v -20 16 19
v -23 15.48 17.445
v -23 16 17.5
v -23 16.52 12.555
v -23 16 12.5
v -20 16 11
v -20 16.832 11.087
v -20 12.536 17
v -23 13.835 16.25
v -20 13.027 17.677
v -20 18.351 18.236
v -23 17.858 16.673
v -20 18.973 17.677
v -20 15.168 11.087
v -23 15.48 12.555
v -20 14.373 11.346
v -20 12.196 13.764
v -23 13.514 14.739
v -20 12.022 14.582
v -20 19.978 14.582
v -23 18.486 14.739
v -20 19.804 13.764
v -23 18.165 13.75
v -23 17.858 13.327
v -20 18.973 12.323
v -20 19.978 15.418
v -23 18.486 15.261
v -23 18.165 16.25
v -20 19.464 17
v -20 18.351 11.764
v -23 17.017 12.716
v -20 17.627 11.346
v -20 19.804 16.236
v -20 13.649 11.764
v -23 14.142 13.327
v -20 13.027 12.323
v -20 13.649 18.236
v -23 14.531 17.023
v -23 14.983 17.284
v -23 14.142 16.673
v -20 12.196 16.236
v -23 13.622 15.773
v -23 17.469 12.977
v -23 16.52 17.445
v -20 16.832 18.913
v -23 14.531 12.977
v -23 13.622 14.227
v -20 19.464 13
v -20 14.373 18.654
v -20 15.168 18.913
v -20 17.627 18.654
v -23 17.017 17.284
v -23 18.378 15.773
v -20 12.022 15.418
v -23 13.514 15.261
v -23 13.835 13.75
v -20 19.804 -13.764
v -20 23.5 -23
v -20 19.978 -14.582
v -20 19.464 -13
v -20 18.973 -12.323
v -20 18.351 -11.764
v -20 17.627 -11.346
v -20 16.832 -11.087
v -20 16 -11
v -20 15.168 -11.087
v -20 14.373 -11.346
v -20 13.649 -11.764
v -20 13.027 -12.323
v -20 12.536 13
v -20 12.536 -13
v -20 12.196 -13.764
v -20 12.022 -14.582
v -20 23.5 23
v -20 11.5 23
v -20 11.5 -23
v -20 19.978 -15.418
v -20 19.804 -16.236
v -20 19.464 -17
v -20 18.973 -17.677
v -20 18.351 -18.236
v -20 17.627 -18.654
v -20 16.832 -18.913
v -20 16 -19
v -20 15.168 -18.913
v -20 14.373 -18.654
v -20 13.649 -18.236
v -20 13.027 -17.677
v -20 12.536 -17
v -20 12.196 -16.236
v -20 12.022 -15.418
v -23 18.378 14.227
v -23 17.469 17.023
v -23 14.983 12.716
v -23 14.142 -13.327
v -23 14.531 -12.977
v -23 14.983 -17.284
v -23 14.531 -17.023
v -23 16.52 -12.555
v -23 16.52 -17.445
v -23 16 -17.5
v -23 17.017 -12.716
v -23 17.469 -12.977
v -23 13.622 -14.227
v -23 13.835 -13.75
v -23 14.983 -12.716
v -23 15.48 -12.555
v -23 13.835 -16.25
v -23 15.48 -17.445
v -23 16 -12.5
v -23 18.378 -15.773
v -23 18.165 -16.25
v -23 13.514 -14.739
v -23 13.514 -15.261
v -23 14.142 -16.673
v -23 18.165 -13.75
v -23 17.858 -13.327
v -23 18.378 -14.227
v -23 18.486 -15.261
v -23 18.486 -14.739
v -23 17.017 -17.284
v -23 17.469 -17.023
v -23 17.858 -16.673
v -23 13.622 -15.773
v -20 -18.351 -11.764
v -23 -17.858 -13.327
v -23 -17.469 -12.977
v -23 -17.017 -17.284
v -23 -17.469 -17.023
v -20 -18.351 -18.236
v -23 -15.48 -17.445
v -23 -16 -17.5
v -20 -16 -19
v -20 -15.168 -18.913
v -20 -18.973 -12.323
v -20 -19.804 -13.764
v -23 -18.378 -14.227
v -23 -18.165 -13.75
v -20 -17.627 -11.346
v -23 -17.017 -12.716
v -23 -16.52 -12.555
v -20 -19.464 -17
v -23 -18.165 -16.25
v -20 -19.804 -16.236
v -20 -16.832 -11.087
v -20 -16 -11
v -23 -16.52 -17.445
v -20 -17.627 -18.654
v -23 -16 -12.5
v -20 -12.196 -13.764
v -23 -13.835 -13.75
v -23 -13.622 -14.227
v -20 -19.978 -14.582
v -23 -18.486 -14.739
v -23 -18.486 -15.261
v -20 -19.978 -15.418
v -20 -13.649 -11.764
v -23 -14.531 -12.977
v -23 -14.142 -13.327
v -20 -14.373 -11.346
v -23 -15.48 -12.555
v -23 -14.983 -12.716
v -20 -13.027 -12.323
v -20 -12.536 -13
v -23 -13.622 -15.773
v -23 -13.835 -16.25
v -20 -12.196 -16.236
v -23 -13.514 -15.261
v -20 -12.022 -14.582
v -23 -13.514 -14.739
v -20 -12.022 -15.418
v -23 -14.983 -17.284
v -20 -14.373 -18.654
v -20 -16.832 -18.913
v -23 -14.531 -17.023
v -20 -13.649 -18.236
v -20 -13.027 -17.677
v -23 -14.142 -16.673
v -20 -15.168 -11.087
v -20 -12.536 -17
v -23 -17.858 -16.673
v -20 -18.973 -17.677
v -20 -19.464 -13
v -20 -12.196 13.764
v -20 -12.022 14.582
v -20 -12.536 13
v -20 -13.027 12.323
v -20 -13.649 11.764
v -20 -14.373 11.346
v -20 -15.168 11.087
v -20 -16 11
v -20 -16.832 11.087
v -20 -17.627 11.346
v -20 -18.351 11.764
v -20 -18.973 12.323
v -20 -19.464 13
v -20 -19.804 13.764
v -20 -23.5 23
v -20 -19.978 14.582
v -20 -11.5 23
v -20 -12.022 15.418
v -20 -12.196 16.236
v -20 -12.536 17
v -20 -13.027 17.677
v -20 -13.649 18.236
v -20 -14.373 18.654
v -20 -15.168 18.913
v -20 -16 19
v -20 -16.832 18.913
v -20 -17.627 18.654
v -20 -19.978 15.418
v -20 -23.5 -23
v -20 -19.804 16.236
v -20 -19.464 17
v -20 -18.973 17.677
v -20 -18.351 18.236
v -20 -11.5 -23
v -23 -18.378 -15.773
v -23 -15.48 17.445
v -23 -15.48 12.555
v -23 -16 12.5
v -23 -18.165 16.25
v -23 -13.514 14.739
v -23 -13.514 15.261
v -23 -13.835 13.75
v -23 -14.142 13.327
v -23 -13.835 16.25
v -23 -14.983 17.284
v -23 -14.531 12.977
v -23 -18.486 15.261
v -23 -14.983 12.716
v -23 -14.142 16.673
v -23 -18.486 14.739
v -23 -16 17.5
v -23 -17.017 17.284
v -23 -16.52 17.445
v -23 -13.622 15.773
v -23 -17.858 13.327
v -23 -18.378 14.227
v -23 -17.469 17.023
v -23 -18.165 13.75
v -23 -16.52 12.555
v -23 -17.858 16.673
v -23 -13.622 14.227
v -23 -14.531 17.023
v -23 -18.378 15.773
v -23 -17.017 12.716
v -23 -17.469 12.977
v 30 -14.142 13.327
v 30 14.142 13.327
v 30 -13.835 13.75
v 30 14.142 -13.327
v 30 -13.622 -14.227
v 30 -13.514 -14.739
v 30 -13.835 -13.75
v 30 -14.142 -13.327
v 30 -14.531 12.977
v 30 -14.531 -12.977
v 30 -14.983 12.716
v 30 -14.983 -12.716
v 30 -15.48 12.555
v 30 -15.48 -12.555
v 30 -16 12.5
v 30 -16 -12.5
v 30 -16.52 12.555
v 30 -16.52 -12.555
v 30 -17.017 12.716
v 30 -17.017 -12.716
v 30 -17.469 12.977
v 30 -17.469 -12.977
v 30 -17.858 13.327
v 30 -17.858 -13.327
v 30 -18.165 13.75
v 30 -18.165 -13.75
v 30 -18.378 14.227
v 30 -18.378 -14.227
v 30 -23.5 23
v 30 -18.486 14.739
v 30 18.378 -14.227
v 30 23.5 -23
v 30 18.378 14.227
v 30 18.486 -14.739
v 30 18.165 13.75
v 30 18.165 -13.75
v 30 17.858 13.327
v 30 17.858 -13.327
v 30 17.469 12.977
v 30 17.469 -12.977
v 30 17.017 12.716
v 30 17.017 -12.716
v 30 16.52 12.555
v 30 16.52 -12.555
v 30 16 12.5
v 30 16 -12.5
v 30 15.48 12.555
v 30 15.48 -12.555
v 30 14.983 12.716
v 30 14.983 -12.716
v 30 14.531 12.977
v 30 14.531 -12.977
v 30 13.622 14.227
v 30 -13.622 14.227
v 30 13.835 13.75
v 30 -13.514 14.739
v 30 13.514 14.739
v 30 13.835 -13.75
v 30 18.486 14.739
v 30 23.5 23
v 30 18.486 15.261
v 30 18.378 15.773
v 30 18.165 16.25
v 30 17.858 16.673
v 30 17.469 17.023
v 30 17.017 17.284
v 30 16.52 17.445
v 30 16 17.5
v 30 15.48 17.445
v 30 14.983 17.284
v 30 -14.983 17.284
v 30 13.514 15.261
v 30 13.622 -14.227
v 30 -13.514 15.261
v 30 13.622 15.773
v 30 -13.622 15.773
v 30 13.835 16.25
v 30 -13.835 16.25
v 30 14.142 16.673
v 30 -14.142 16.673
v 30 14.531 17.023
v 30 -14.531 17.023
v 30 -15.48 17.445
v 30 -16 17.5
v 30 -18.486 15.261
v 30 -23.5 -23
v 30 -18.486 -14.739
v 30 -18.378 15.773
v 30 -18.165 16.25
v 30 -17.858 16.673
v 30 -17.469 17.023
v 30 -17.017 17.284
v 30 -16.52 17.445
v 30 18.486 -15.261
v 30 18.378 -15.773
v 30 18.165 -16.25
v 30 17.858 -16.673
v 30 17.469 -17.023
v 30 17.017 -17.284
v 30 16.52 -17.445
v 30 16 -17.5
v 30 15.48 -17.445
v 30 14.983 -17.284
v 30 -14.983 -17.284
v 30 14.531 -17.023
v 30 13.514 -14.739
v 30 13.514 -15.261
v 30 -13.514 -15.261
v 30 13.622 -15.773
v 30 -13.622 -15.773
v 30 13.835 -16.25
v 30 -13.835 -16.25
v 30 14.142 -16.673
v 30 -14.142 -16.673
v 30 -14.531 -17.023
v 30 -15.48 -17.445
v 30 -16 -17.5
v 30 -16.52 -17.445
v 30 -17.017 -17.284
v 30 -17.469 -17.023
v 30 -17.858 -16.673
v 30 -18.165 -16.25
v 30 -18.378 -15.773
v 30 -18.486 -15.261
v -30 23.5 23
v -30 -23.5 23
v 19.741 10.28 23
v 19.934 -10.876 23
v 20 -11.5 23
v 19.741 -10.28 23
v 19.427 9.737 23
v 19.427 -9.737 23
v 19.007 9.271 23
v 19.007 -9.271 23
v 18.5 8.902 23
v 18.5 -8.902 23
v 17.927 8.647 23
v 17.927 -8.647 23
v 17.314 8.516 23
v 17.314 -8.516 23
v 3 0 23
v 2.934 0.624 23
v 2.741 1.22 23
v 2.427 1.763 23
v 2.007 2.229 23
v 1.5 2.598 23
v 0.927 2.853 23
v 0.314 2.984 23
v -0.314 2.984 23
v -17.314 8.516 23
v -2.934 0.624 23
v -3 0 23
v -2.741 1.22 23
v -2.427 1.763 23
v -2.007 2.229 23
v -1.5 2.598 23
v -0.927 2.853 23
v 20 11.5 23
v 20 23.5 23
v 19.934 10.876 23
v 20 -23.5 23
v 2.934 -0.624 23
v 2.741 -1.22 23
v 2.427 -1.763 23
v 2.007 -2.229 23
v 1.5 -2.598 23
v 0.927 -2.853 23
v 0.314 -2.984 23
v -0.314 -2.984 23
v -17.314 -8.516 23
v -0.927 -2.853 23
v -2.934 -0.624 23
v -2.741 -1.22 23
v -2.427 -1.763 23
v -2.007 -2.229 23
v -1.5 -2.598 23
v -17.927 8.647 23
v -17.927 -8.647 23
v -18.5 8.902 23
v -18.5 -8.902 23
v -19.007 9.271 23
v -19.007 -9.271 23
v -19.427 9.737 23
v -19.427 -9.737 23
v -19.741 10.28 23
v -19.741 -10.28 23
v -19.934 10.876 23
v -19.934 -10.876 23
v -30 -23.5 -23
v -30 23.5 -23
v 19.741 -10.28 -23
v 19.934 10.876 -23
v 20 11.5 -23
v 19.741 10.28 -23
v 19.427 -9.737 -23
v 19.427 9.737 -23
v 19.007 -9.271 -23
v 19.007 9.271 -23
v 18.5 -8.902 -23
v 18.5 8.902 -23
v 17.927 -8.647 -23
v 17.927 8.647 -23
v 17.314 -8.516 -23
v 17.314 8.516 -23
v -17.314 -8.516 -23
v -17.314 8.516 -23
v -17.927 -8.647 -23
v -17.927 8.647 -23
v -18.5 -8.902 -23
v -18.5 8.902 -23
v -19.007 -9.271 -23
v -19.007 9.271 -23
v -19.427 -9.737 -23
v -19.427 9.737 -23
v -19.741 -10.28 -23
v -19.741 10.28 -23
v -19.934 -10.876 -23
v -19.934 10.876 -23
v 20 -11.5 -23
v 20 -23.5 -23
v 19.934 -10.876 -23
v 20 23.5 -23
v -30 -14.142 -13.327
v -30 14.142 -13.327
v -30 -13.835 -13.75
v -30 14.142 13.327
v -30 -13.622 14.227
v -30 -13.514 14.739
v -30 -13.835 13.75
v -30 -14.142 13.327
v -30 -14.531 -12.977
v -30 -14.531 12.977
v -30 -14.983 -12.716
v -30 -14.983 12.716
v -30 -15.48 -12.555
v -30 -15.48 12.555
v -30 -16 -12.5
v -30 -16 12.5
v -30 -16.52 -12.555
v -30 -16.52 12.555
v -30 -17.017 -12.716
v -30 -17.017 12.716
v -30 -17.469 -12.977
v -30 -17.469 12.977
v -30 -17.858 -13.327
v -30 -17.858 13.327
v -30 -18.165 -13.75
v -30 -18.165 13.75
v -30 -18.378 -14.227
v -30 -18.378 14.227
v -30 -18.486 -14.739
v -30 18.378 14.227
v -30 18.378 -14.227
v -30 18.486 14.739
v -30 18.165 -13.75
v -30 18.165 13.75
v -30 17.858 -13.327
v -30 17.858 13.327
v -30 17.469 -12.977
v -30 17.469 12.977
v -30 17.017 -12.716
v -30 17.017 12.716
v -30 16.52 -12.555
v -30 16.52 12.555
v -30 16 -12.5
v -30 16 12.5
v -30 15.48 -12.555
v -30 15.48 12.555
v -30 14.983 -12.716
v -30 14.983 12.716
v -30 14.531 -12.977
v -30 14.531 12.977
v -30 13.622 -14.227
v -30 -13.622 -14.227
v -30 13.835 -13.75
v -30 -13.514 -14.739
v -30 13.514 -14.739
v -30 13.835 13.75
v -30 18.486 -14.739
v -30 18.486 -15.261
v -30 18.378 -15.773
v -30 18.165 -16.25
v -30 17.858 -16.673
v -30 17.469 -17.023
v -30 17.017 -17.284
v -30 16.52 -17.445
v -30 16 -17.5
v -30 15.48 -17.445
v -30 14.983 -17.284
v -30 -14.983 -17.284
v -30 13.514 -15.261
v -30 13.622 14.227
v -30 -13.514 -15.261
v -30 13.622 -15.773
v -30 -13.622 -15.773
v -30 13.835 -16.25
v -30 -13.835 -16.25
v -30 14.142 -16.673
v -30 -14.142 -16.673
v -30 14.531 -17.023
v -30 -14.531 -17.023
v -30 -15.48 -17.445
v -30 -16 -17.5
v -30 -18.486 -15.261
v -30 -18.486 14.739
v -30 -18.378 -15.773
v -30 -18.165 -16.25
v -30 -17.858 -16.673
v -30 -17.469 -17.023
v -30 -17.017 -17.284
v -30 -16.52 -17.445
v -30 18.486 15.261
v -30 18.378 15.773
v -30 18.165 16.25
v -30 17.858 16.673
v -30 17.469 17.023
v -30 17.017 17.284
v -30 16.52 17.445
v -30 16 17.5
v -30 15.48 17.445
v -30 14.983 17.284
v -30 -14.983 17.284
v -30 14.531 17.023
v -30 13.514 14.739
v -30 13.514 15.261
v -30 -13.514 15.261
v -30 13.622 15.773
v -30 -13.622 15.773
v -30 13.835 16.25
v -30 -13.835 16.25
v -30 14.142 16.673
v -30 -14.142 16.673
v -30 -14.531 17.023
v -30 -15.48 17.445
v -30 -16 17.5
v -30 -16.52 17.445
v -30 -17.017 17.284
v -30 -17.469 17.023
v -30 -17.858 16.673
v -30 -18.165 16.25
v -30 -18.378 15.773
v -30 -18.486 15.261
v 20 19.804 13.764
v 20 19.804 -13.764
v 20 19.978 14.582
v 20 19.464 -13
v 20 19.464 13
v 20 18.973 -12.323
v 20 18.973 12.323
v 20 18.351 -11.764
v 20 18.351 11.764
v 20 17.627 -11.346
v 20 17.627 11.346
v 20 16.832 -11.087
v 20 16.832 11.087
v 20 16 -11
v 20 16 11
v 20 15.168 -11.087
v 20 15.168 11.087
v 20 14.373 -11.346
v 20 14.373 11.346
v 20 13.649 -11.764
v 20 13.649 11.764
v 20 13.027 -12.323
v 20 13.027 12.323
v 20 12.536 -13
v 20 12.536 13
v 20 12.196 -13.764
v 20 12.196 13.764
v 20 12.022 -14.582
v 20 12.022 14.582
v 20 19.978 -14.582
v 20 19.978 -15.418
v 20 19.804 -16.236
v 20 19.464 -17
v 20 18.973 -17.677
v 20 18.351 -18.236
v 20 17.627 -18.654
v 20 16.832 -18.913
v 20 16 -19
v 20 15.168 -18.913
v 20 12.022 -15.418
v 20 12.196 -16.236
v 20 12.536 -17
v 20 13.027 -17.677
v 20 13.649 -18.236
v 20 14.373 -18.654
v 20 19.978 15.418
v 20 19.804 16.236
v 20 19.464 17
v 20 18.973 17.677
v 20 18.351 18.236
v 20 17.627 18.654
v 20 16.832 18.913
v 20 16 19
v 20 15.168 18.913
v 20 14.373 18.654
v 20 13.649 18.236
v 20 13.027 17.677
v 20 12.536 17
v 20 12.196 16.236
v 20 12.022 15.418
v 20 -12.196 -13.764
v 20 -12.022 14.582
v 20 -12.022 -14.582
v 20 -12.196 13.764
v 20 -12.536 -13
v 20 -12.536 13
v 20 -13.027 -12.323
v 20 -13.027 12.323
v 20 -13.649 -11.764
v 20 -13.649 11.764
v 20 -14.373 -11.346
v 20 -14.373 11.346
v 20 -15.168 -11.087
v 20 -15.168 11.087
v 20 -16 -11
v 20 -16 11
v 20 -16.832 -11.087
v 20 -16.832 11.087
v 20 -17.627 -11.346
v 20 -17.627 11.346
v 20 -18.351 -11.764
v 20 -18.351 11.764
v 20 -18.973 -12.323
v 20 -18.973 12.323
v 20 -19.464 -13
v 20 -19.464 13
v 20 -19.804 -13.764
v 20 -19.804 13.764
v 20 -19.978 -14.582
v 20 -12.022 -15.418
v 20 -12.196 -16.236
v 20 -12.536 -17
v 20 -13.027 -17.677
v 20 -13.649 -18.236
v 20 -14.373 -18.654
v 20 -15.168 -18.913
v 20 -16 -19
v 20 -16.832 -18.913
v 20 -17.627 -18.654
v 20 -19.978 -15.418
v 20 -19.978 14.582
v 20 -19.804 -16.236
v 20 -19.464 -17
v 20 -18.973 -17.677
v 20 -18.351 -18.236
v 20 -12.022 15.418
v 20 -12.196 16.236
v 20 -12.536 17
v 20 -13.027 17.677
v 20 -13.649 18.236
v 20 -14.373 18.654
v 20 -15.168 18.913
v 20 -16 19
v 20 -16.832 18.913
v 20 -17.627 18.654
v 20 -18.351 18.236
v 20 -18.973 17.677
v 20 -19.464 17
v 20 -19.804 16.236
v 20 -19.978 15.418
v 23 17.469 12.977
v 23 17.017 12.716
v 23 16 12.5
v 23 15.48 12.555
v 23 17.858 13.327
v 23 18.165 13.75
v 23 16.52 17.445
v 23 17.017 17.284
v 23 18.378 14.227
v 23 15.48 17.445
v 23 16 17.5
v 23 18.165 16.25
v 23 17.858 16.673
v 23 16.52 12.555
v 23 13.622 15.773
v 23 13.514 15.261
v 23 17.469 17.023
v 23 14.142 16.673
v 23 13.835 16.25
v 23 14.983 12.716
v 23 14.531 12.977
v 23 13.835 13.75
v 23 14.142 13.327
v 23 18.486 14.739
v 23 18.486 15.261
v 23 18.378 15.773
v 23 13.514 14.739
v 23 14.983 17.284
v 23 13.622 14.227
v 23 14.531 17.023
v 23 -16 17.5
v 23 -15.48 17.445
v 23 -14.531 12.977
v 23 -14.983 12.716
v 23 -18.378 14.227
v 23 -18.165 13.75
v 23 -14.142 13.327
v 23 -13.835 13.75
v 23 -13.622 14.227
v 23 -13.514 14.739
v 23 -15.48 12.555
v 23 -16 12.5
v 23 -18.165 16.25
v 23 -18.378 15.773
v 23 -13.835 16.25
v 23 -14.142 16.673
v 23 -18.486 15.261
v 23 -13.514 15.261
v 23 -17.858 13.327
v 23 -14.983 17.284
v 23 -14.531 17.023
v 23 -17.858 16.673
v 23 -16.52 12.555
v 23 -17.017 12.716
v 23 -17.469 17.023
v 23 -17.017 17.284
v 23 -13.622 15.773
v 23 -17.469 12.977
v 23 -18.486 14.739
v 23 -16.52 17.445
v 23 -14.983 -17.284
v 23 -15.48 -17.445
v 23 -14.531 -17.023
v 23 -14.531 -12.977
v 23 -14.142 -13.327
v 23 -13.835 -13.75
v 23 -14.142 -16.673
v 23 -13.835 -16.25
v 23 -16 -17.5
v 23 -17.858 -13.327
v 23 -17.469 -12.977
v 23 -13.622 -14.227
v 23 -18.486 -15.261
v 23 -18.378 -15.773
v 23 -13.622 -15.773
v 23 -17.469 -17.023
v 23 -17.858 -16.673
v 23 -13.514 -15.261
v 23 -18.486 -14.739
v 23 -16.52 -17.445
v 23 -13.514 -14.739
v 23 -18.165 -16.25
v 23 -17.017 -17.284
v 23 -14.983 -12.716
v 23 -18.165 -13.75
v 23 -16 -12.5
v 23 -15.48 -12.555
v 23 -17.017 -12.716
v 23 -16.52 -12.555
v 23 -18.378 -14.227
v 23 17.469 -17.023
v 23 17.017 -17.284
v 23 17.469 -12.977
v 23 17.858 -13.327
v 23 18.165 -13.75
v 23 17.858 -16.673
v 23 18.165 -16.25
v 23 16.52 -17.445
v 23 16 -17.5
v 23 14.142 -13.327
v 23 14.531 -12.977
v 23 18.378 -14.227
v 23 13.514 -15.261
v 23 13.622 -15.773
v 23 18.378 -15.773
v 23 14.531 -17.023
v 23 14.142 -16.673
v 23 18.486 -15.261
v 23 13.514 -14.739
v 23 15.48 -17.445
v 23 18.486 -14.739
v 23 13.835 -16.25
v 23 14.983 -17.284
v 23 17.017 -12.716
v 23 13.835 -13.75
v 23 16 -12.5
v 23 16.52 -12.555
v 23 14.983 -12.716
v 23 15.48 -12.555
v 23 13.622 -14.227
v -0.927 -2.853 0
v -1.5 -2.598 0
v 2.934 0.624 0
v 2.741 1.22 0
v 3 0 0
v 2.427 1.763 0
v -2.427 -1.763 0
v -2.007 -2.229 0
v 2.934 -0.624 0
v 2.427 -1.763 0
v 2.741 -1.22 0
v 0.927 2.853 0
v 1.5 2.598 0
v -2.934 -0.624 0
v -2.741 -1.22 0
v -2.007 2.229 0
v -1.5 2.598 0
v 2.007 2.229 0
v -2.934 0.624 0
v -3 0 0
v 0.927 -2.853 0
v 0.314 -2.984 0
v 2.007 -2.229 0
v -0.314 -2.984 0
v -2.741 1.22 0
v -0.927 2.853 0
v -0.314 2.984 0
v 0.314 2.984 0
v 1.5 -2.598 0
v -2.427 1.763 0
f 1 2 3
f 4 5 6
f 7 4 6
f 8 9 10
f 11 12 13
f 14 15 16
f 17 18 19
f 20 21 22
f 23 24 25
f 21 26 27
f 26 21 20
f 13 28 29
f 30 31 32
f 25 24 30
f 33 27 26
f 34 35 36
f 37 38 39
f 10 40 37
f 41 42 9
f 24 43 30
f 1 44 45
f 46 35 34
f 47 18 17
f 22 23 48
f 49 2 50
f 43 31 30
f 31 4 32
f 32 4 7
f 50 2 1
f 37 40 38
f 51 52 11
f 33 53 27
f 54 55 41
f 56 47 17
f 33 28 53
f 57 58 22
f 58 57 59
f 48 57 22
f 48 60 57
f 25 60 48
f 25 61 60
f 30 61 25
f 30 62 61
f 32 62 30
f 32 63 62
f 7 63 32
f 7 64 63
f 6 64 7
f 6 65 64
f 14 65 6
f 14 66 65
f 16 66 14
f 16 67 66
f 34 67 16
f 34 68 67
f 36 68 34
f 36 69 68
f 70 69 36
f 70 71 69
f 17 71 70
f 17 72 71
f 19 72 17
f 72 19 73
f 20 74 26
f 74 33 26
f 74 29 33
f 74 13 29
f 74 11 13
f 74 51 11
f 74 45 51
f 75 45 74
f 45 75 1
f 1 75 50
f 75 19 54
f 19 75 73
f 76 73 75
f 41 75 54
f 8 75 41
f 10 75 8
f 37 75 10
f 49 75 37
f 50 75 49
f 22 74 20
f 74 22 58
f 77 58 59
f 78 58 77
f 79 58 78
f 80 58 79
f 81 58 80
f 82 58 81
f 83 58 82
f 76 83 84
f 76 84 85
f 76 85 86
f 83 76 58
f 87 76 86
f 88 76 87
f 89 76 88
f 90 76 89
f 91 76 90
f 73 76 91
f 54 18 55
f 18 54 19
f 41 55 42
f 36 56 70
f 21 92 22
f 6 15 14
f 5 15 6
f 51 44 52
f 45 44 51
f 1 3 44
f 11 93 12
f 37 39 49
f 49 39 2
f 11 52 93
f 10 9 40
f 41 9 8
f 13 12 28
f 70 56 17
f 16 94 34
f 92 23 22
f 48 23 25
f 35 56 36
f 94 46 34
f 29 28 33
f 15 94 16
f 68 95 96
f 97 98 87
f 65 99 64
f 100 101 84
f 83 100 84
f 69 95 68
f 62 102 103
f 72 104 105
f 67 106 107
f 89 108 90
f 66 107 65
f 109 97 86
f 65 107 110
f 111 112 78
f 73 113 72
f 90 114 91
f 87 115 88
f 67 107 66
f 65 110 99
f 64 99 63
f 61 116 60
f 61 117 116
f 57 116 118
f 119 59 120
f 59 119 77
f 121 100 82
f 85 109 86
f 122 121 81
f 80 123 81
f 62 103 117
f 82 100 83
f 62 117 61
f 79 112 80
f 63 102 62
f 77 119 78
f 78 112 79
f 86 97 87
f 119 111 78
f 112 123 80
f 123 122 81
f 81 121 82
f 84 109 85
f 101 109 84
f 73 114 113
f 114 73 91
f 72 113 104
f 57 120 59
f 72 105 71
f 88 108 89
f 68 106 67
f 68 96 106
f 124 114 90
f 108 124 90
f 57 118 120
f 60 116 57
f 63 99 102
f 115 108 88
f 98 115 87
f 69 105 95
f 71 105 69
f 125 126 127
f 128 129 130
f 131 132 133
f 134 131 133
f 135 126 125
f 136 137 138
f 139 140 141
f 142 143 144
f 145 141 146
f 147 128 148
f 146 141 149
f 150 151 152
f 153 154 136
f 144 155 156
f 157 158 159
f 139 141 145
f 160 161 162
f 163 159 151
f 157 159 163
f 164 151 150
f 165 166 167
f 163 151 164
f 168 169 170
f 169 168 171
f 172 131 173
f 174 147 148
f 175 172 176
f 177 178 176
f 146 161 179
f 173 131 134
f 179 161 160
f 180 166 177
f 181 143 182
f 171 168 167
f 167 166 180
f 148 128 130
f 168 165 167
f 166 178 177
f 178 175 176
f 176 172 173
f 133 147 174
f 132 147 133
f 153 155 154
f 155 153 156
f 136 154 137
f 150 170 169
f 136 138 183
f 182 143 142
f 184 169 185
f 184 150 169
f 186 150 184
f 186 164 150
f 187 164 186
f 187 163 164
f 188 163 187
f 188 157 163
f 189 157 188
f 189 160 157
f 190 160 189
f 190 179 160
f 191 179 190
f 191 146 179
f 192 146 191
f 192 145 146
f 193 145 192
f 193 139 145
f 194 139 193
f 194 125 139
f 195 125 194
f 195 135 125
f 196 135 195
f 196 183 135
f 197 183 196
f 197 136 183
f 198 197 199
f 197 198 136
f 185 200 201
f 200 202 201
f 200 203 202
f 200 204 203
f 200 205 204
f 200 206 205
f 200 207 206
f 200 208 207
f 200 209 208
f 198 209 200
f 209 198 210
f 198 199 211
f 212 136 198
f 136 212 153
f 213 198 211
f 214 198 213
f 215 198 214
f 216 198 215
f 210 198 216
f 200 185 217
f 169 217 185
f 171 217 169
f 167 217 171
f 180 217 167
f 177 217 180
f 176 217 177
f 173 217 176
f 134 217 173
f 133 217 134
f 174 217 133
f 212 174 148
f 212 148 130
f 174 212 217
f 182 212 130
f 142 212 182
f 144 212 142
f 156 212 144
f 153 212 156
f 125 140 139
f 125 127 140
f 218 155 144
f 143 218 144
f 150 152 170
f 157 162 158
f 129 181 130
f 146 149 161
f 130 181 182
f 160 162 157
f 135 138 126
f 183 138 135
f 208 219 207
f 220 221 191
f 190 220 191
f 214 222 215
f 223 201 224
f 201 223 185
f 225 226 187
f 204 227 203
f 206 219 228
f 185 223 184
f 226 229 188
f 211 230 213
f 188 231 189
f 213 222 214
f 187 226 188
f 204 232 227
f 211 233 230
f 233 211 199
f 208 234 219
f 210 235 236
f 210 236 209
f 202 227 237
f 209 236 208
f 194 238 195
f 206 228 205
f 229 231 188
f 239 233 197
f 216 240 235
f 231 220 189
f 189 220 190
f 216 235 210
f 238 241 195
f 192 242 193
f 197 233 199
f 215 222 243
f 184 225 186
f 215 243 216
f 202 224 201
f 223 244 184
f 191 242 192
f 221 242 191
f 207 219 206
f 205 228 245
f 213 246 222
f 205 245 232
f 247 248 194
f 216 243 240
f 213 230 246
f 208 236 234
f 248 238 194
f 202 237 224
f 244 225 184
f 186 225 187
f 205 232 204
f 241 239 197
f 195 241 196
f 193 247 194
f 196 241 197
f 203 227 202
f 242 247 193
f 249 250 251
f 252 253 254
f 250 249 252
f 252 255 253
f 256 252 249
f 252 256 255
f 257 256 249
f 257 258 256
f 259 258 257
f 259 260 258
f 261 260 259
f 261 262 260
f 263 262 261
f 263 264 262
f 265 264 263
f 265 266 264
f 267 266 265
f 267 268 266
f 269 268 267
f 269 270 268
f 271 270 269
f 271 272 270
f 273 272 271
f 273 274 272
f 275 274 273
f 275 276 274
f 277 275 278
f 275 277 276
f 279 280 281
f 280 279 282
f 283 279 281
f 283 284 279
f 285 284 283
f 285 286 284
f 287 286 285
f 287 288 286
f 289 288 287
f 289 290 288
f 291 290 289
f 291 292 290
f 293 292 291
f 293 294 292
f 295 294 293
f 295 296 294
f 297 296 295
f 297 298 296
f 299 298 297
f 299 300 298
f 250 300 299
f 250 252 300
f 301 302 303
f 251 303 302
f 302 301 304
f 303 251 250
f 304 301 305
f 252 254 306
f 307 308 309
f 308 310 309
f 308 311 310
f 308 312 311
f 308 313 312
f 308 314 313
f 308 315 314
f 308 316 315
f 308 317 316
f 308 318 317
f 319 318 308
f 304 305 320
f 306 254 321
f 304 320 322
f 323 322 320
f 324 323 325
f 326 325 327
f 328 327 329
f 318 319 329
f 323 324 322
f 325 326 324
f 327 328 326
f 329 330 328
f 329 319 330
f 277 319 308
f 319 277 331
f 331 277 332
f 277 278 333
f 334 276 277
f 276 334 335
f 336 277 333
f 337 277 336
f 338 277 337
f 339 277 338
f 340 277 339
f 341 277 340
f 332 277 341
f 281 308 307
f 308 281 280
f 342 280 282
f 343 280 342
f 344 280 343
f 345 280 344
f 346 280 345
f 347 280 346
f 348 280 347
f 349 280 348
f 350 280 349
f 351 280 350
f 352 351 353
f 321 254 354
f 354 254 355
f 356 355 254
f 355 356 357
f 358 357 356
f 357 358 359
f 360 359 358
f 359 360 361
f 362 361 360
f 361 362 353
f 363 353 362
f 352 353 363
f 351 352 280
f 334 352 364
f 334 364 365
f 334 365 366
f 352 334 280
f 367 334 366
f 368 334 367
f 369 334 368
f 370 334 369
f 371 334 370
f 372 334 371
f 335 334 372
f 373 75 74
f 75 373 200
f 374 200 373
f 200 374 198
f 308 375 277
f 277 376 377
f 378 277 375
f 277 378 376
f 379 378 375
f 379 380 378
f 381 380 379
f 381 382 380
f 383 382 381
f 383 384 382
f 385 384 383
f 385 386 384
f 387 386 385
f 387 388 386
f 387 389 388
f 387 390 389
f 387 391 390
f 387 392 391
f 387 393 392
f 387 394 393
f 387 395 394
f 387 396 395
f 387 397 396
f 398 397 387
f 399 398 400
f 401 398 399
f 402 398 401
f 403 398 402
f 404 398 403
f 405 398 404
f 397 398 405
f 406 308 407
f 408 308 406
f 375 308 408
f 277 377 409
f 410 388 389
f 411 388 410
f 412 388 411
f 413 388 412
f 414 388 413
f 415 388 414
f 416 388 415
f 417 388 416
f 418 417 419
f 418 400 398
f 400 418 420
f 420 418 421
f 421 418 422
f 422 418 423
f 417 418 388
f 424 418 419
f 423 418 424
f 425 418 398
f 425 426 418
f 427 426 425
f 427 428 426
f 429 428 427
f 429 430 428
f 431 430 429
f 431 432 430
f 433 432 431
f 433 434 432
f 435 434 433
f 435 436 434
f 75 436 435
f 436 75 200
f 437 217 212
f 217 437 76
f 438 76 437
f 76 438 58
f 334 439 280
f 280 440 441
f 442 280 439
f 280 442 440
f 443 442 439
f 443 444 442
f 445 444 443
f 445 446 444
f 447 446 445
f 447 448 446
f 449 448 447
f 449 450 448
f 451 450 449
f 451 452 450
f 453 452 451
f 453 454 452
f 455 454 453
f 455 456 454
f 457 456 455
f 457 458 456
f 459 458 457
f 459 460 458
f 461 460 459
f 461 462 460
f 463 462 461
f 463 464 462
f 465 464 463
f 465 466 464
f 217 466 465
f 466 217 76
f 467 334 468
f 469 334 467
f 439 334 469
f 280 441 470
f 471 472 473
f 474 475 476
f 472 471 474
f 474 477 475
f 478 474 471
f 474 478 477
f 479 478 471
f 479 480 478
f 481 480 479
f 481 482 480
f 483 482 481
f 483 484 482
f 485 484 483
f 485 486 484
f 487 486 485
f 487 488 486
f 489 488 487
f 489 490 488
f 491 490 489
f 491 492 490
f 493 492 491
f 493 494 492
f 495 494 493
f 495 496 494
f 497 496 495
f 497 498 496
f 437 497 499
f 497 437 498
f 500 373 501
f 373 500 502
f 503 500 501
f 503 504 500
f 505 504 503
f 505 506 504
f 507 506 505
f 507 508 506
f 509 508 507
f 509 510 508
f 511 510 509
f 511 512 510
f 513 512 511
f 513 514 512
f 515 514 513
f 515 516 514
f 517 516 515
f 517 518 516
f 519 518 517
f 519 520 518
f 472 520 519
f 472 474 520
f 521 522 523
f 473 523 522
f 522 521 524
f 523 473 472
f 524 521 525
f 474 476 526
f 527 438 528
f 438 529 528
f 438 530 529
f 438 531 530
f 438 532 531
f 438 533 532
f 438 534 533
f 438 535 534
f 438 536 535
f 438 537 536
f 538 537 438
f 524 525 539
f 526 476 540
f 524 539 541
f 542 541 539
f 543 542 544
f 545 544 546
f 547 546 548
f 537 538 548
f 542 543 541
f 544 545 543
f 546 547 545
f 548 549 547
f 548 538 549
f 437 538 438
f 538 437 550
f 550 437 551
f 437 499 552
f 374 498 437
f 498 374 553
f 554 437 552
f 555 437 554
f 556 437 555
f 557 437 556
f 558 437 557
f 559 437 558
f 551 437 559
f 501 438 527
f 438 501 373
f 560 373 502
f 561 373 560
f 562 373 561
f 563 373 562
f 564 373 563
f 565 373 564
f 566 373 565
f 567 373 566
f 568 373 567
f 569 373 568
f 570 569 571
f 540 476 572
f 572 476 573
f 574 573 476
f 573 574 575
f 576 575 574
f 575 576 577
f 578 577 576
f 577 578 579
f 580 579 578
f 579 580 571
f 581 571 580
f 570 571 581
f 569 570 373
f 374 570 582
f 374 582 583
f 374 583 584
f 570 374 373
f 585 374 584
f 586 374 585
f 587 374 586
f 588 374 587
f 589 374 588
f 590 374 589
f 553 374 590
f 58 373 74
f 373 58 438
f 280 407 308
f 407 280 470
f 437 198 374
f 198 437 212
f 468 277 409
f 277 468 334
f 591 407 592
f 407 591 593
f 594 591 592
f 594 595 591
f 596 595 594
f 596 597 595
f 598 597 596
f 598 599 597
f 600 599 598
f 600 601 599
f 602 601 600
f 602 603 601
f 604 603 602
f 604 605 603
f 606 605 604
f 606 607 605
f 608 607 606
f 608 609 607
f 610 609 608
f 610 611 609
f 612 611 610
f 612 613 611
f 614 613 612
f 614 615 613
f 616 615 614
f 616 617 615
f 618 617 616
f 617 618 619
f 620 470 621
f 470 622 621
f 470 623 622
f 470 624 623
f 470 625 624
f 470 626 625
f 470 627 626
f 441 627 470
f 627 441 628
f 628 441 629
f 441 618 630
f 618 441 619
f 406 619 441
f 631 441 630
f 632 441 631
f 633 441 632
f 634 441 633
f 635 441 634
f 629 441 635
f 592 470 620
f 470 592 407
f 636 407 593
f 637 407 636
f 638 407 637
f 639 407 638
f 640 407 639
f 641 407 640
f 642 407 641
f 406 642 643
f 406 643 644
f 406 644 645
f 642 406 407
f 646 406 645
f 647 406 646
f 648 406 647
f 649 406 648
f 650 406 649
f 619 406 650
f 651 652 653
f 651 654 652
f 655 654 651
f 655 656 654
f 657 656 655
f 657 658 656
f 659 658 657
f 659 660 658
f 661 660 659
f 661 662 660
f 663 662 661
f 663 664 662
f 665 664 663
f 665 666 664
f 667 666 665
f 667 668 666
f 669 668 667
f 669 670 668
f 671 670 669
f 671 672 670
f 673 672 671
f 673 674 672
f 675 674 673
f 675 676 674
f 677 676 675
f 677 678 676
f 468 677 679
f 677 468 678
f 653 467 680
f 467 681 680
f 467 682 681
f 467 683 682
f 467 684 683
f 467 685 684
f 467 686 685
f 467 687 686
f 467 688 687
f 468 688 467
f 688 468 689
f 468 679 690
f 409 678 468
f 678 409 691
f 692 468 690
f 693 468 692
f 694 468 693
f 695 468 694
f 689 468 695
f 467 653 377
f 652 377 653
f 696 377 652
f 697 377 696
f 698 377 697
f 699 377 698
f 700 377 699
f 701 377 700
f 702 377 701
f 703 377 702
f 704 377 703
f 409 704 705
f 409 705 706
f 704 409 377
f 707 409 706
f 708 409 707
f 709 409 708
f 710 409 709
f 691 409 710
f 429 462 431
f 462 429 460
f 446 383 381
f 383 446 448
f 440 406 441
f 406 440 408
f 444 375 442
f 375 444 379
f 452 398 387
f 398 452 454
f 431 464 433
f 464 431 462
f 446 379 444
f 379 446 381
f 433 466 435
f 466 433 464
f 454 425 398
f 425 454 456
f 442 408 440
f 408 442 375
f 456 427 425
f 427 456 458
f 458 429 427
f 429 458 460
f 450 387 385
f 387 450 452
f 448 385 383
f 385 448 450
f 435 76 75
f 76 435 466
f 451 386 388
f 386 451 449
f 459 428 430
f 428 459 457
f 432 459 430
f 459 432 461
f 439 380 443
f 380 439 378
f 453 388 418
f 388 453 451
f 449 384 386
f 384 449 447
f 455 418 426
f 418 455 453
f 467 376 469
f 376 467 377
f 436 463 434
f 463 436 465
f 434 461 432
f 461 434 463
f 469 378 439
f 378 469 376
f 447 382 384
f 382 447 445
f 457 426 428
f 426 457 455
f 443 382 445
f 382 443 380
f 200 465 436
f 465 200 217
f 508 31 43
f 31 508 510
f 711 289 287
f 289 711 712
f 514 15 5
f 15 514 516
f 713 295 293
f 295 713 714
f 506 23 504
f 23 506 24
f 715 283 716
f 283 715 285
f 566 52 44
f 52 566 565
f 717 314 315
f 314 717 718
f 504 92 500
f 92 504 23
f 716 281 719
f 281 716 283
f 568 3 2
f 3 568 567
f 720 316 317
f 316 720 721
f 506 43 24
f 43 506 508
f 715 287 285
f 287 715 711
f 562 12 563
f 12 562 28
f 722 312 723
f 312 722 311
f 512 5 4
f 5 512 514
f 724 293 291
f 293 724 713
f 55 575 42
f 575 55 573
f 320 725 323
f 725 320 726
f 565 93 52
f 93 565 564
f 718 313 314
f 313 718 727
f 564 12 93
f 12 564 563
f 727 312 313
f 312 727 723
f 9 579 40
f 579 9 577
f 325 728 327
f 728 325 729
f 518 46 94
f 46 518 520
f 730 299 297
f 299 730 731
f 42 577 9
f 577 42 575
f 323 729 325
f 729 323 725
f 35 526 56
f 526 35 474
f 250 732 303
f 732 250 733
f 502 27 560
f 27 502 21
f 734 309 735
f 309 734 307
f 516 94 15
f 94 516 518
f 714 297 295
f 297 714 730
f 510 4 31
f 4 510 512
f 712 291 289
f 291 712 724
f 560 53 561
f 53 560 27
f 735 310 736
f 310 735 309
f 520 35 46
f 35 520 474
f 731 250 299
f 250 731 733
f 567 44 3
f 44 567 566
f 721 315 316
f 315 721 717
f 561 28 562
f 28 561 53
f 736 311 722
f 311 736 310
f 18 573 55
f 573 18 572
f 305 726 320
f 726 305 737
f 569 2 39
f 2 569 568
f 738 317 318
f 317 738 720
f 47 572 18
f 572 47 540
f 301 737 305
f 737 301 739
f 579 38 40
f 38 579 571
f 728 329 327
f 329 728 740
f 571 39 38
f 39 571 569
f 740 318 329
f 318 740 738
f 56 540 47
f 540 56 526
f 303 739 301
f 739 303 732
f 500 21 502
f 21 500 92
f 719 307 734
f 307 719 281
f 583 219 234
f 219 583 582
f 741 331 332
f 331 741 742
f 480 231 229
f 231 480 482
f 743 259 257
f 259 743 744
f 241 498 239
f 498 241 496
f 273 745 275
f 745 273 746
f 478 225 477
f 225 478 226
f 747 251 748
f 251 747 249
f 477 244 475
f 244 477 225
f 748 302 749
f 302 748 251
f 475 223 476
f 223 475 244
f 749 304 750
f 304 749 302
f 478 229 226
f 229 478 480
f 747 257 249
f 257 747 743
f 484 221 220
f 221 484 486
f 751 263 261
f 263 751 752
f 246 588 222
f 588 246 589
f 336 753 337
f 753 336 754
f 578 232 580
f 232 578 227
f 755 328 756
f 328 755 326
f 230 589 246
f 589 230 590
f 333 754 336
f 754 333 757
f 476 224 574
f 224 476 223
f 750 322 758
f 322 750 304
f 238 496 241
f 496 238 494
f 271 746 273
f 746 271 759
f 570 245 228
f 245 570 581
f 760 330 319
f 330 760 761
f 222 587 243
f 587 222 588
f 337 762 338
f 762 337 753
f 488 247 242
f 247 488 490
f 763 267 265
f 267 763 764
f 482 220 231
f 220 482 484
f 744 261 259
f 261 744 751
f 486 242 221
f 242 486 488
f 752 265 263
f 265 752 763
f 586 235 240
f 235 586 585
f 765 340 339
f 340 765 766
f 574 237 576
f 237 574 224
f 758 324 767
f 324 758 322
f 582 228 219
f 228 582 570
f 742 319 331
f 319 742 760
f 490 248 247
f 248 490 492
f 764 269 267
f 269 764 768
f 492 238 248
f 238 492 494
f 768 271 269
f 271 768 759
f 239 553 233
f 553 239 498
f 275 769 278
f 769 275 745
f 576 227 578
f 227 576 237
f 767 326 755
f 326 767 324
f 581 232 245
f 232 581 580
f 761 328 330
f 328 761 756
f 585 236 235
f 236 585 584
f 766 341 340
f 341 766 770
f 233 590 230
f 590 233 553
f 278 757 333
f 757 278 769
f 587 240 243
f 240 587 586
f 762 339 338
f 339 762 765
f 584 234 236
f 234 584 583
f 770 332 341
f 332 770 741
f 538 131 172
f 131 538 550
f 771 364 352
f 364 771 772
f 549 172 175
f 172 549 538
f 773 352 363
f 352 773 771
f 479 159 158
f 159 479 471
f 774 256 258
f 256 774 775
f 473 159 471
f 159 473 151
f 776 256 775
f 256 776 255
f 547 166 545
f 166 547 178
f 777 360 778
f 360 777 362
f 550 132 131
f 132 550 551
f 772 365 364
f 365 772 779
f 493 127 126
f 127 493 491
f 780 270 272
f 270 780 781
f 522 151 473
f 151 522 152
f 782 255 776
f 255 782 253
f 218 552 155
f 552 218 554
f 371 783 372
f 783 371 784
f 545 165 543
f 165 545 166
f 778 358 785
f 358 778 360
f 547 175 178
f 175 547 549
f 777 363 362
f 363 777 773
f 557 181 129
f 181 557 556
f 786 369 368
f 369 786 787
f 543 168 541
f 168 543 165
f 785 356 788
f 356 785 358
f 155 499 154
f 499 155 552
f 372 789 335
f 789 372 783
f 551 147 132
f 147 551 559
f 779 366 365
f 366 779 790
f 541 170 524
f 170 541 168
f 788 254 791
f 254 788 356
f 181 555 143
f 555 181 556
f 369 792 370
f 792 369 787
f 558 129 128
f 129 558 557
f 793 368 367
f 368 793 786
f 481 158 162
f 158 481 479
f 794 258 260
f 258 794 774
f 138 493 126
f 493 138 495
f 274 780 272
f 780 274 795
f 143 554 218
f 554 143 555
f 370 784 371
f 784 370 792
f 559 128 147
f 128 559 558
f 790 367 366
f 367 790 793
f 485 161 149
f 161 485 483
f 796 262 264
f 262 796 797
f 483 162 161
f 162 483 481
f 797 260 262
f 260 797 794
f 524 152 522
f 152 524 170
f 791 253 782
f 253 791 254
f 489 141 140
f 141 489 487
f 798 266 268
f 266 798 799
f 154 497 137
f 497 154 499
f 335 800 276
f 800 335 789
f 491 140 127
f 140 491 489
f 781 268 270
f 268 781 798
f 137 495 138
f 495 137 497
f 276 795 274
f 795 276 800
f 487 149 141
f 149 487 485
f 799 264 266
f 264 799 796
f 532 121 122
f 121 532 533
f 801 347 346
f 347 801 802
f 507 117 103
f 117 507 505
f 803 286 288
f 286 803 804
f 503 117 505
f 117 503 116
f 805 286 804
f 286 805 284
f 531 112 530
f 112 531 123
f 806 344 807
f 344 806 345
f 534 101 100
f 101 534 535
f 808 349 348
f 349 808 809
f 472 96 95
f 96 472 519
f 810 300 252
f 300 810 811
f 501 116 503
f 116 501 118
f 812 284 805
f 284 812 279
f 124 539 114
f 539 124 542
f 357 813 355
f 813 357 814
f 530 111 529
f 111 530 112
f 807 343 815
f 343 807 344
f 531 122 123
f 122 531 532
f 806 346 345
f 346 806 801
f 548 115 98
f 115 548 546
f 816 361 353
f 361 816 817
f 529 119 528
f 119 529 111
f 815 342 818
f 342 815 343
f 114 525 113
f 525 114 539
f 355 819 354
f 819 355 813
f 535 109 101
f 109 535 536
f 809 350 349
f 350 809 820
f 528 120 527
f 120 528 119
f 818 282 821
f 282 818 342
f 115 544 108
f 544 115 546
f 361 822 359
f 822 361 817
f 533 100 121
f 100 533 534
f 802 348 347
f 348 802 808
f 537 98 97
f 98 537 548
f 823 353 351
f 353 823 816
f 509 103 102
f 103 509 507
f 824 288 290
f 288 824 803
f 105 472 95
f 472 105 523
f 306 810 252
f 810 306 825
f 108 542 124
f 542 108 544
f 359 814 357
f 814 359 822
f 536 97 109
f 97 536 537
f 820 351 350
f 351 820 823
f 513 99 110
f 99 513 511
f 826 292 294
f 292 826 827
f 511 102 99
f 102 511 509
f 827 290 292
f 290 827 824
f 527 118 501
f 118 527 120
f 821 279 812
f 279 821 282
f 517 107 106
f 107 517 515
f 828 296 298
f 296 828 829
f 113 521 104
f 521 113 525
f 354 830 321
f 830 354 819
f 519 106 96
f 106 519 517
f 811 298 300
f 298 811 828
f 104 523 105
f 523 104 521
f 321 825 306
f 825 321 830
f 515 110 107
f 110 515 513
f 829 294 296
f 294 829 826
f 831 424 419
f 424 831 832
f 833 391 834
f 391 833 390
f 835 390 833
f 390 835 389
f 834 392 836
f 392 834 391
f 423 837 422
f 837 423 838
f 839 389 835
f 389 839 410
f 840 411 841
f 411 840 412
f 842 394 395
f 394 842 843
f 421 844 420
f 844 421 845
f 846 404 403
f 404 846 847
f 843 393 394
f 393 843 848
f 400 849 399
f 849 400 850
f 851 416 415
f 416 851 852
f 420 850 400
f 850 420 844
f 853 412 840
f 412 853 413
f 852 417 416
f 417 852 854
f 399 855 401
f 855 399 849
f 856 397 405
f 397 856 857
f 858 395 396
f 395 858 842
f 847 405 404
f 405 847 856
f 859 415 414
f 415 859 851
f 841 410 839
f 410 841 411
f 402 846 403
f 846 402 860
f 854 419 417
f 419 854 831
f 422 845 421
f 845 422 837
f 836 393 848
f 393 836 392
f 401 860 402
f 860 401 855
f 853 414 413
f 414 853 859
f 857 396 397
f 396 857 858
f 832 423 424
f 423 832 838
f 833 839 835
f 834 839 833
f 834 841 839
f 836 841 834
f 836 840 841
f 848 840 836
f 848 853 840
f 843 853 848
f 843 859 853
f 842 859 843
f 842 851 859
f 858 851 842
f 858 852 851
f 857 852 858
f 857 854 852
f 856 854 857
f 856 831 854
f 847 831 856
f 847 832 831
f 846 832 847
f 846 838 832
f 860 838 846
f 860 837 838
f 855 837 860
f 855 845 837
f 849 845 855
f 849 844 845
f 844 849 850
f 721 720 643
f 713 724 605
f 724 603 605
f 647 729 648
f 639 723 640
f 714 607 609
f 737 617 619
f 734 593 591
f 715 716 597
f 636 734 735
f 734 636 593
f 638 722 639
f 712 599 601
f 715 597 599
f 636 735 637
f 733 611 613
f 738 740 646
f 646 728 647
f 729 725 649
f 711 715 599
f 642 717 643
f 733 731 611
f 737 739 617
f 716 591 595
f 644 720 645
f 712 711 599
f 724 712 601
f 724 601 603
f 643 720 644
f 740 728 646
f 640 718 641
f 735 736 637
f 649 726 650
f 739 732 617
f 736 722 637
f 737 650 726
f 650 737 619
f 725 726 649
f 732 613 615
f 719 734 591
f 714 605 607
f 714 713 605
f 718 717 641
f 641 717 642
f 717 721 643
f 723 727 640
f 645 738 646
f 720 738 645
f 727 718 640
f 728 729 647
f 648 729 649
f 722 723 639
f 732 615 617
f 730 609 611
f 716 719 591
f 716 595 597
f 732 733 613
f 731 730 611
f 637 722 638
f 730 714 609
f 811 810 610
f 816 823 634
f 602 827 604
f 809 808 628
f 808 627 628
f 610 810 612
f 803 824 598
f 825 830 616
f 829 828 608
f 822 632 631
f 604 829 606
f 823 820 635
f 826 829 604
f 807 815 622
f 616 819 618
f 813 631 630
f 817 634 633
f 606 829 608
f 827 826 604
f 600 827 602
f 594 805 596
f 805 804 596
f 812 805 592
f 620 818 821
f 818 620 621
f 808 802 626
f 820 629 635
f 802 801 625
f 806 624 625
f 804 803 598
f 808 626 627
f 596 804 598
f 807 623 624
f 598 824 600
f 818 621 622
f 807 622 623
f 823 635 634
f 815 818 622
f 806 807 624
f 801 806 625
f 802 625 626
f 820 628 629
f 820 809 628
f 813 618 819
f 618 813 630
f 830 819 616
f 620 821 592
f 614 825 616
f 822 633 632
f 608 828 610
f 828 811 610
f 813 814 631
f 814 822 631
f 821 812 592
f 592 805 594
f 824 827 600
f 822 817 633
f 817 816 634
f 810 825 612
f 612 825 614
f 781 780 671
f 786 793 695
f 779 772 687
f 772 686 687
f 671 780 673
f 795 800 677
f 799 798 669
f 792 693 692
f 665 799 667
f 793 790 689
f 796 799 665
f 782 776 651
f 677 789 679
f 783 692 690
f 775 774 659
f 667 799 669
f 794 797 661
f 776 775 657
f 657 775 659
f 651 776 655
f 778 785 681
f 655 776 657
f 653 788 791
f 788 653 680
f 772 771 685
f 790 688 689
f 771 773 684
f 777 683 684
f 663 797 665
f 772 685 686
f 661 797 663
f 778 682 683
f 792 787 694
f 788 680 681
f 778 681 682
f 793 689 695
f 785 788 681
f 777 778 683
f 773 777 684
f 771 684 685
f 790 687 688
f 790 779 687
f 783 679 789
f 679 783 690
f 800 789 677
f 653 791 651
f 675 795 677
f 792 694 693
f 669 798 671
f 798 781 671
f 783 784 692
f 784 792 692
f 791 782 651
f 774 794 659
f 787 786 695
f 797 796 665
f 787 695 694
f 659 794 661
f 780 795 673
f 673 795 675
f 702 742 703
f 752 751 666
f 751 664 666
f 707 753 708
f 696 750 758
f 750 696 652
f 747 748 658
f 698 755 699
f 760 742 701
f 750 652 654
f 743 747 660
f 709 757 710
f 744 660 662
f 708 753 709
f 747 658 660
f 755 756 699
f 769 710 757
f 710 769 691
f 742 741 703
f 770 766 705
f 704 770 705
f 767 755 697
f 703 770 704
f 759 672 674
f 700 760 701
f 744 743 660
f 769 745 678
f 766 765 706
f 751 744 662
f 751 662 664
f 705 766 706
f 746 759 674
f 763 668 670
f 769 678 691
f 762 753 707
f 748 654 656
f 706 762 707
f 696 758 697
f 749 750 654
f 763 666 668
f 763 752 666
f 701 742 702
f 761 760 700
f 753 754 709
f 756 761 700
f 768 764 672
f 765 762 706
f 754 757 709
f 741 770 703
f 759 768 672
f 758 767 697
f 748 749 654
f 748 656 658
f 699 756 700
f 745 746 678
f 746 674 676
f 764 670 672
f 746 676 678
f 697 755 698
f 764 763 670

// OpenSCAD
$fn=30;

difference(){
translate([-30,-23.5,-23])cube([60,47,46]);

translate([-20,11.5,-24])cube([40,47,66]);
rotate([0,0,180])translate([-20,11.5,-24])cube([40,47,66]);

translate([0,11.5,-24])
hull(){
translate([17,0,0])cylinder(d=6,h=70);
translate([-17,0,0])cylinder(d=6,h=70);
}
translate([0,-11.5,-24])
hull(){
translate([17,0,0])cylinder(d=6,h=70);
translate([-17,0,0])cylinder(d=6,h=70);
}

translate([0,16,15])
rotate([0,90,0])cylinder(d=5,h=70,center=true);
translate([0,-16,15])
rotate([0,90,0])cylinder(d=5,h=70,center=true);
translate([0,-16,-15])
rotate([0,90,0])cylinder(d=5,h=70,center=true);
translate([0,16,-15])
rotate([0,90,0])cylinder(d=5,h=70,center=true);

cylinder(d=6,h=70);

translate([20,16,15])
rotate([0,90,0])cylinder(d1=8,d2=5,h=3);
translate([20,16,-15])
rotate([0,90,0])cylinder(d1=8,d2=5,h=3);
translate([20,-16,-15])
rotate([0,90,0])cylinder(d1=8,d2=5,h=3);
translate([20,-16,15])
rotate([0,90,0])cylinder(d1=8,d2=5,h=3);

mirror([1,0,0]){
translate([20,16,15])
rotate([0,90,0])cylinder(d1=8,d2=5,h=3);
translate([20,16,-15])
rotate([0,90,0])cylinder(d1=8,d2=5,h=3);
translate([20,-16,-15])
rotate([0,90,0])cylinder(d1=8,d2=5,h=3);
translate([20,-16,15])
rotate([0,90,0])cylinder(d1=8,d2=5,h=3);
}

}
